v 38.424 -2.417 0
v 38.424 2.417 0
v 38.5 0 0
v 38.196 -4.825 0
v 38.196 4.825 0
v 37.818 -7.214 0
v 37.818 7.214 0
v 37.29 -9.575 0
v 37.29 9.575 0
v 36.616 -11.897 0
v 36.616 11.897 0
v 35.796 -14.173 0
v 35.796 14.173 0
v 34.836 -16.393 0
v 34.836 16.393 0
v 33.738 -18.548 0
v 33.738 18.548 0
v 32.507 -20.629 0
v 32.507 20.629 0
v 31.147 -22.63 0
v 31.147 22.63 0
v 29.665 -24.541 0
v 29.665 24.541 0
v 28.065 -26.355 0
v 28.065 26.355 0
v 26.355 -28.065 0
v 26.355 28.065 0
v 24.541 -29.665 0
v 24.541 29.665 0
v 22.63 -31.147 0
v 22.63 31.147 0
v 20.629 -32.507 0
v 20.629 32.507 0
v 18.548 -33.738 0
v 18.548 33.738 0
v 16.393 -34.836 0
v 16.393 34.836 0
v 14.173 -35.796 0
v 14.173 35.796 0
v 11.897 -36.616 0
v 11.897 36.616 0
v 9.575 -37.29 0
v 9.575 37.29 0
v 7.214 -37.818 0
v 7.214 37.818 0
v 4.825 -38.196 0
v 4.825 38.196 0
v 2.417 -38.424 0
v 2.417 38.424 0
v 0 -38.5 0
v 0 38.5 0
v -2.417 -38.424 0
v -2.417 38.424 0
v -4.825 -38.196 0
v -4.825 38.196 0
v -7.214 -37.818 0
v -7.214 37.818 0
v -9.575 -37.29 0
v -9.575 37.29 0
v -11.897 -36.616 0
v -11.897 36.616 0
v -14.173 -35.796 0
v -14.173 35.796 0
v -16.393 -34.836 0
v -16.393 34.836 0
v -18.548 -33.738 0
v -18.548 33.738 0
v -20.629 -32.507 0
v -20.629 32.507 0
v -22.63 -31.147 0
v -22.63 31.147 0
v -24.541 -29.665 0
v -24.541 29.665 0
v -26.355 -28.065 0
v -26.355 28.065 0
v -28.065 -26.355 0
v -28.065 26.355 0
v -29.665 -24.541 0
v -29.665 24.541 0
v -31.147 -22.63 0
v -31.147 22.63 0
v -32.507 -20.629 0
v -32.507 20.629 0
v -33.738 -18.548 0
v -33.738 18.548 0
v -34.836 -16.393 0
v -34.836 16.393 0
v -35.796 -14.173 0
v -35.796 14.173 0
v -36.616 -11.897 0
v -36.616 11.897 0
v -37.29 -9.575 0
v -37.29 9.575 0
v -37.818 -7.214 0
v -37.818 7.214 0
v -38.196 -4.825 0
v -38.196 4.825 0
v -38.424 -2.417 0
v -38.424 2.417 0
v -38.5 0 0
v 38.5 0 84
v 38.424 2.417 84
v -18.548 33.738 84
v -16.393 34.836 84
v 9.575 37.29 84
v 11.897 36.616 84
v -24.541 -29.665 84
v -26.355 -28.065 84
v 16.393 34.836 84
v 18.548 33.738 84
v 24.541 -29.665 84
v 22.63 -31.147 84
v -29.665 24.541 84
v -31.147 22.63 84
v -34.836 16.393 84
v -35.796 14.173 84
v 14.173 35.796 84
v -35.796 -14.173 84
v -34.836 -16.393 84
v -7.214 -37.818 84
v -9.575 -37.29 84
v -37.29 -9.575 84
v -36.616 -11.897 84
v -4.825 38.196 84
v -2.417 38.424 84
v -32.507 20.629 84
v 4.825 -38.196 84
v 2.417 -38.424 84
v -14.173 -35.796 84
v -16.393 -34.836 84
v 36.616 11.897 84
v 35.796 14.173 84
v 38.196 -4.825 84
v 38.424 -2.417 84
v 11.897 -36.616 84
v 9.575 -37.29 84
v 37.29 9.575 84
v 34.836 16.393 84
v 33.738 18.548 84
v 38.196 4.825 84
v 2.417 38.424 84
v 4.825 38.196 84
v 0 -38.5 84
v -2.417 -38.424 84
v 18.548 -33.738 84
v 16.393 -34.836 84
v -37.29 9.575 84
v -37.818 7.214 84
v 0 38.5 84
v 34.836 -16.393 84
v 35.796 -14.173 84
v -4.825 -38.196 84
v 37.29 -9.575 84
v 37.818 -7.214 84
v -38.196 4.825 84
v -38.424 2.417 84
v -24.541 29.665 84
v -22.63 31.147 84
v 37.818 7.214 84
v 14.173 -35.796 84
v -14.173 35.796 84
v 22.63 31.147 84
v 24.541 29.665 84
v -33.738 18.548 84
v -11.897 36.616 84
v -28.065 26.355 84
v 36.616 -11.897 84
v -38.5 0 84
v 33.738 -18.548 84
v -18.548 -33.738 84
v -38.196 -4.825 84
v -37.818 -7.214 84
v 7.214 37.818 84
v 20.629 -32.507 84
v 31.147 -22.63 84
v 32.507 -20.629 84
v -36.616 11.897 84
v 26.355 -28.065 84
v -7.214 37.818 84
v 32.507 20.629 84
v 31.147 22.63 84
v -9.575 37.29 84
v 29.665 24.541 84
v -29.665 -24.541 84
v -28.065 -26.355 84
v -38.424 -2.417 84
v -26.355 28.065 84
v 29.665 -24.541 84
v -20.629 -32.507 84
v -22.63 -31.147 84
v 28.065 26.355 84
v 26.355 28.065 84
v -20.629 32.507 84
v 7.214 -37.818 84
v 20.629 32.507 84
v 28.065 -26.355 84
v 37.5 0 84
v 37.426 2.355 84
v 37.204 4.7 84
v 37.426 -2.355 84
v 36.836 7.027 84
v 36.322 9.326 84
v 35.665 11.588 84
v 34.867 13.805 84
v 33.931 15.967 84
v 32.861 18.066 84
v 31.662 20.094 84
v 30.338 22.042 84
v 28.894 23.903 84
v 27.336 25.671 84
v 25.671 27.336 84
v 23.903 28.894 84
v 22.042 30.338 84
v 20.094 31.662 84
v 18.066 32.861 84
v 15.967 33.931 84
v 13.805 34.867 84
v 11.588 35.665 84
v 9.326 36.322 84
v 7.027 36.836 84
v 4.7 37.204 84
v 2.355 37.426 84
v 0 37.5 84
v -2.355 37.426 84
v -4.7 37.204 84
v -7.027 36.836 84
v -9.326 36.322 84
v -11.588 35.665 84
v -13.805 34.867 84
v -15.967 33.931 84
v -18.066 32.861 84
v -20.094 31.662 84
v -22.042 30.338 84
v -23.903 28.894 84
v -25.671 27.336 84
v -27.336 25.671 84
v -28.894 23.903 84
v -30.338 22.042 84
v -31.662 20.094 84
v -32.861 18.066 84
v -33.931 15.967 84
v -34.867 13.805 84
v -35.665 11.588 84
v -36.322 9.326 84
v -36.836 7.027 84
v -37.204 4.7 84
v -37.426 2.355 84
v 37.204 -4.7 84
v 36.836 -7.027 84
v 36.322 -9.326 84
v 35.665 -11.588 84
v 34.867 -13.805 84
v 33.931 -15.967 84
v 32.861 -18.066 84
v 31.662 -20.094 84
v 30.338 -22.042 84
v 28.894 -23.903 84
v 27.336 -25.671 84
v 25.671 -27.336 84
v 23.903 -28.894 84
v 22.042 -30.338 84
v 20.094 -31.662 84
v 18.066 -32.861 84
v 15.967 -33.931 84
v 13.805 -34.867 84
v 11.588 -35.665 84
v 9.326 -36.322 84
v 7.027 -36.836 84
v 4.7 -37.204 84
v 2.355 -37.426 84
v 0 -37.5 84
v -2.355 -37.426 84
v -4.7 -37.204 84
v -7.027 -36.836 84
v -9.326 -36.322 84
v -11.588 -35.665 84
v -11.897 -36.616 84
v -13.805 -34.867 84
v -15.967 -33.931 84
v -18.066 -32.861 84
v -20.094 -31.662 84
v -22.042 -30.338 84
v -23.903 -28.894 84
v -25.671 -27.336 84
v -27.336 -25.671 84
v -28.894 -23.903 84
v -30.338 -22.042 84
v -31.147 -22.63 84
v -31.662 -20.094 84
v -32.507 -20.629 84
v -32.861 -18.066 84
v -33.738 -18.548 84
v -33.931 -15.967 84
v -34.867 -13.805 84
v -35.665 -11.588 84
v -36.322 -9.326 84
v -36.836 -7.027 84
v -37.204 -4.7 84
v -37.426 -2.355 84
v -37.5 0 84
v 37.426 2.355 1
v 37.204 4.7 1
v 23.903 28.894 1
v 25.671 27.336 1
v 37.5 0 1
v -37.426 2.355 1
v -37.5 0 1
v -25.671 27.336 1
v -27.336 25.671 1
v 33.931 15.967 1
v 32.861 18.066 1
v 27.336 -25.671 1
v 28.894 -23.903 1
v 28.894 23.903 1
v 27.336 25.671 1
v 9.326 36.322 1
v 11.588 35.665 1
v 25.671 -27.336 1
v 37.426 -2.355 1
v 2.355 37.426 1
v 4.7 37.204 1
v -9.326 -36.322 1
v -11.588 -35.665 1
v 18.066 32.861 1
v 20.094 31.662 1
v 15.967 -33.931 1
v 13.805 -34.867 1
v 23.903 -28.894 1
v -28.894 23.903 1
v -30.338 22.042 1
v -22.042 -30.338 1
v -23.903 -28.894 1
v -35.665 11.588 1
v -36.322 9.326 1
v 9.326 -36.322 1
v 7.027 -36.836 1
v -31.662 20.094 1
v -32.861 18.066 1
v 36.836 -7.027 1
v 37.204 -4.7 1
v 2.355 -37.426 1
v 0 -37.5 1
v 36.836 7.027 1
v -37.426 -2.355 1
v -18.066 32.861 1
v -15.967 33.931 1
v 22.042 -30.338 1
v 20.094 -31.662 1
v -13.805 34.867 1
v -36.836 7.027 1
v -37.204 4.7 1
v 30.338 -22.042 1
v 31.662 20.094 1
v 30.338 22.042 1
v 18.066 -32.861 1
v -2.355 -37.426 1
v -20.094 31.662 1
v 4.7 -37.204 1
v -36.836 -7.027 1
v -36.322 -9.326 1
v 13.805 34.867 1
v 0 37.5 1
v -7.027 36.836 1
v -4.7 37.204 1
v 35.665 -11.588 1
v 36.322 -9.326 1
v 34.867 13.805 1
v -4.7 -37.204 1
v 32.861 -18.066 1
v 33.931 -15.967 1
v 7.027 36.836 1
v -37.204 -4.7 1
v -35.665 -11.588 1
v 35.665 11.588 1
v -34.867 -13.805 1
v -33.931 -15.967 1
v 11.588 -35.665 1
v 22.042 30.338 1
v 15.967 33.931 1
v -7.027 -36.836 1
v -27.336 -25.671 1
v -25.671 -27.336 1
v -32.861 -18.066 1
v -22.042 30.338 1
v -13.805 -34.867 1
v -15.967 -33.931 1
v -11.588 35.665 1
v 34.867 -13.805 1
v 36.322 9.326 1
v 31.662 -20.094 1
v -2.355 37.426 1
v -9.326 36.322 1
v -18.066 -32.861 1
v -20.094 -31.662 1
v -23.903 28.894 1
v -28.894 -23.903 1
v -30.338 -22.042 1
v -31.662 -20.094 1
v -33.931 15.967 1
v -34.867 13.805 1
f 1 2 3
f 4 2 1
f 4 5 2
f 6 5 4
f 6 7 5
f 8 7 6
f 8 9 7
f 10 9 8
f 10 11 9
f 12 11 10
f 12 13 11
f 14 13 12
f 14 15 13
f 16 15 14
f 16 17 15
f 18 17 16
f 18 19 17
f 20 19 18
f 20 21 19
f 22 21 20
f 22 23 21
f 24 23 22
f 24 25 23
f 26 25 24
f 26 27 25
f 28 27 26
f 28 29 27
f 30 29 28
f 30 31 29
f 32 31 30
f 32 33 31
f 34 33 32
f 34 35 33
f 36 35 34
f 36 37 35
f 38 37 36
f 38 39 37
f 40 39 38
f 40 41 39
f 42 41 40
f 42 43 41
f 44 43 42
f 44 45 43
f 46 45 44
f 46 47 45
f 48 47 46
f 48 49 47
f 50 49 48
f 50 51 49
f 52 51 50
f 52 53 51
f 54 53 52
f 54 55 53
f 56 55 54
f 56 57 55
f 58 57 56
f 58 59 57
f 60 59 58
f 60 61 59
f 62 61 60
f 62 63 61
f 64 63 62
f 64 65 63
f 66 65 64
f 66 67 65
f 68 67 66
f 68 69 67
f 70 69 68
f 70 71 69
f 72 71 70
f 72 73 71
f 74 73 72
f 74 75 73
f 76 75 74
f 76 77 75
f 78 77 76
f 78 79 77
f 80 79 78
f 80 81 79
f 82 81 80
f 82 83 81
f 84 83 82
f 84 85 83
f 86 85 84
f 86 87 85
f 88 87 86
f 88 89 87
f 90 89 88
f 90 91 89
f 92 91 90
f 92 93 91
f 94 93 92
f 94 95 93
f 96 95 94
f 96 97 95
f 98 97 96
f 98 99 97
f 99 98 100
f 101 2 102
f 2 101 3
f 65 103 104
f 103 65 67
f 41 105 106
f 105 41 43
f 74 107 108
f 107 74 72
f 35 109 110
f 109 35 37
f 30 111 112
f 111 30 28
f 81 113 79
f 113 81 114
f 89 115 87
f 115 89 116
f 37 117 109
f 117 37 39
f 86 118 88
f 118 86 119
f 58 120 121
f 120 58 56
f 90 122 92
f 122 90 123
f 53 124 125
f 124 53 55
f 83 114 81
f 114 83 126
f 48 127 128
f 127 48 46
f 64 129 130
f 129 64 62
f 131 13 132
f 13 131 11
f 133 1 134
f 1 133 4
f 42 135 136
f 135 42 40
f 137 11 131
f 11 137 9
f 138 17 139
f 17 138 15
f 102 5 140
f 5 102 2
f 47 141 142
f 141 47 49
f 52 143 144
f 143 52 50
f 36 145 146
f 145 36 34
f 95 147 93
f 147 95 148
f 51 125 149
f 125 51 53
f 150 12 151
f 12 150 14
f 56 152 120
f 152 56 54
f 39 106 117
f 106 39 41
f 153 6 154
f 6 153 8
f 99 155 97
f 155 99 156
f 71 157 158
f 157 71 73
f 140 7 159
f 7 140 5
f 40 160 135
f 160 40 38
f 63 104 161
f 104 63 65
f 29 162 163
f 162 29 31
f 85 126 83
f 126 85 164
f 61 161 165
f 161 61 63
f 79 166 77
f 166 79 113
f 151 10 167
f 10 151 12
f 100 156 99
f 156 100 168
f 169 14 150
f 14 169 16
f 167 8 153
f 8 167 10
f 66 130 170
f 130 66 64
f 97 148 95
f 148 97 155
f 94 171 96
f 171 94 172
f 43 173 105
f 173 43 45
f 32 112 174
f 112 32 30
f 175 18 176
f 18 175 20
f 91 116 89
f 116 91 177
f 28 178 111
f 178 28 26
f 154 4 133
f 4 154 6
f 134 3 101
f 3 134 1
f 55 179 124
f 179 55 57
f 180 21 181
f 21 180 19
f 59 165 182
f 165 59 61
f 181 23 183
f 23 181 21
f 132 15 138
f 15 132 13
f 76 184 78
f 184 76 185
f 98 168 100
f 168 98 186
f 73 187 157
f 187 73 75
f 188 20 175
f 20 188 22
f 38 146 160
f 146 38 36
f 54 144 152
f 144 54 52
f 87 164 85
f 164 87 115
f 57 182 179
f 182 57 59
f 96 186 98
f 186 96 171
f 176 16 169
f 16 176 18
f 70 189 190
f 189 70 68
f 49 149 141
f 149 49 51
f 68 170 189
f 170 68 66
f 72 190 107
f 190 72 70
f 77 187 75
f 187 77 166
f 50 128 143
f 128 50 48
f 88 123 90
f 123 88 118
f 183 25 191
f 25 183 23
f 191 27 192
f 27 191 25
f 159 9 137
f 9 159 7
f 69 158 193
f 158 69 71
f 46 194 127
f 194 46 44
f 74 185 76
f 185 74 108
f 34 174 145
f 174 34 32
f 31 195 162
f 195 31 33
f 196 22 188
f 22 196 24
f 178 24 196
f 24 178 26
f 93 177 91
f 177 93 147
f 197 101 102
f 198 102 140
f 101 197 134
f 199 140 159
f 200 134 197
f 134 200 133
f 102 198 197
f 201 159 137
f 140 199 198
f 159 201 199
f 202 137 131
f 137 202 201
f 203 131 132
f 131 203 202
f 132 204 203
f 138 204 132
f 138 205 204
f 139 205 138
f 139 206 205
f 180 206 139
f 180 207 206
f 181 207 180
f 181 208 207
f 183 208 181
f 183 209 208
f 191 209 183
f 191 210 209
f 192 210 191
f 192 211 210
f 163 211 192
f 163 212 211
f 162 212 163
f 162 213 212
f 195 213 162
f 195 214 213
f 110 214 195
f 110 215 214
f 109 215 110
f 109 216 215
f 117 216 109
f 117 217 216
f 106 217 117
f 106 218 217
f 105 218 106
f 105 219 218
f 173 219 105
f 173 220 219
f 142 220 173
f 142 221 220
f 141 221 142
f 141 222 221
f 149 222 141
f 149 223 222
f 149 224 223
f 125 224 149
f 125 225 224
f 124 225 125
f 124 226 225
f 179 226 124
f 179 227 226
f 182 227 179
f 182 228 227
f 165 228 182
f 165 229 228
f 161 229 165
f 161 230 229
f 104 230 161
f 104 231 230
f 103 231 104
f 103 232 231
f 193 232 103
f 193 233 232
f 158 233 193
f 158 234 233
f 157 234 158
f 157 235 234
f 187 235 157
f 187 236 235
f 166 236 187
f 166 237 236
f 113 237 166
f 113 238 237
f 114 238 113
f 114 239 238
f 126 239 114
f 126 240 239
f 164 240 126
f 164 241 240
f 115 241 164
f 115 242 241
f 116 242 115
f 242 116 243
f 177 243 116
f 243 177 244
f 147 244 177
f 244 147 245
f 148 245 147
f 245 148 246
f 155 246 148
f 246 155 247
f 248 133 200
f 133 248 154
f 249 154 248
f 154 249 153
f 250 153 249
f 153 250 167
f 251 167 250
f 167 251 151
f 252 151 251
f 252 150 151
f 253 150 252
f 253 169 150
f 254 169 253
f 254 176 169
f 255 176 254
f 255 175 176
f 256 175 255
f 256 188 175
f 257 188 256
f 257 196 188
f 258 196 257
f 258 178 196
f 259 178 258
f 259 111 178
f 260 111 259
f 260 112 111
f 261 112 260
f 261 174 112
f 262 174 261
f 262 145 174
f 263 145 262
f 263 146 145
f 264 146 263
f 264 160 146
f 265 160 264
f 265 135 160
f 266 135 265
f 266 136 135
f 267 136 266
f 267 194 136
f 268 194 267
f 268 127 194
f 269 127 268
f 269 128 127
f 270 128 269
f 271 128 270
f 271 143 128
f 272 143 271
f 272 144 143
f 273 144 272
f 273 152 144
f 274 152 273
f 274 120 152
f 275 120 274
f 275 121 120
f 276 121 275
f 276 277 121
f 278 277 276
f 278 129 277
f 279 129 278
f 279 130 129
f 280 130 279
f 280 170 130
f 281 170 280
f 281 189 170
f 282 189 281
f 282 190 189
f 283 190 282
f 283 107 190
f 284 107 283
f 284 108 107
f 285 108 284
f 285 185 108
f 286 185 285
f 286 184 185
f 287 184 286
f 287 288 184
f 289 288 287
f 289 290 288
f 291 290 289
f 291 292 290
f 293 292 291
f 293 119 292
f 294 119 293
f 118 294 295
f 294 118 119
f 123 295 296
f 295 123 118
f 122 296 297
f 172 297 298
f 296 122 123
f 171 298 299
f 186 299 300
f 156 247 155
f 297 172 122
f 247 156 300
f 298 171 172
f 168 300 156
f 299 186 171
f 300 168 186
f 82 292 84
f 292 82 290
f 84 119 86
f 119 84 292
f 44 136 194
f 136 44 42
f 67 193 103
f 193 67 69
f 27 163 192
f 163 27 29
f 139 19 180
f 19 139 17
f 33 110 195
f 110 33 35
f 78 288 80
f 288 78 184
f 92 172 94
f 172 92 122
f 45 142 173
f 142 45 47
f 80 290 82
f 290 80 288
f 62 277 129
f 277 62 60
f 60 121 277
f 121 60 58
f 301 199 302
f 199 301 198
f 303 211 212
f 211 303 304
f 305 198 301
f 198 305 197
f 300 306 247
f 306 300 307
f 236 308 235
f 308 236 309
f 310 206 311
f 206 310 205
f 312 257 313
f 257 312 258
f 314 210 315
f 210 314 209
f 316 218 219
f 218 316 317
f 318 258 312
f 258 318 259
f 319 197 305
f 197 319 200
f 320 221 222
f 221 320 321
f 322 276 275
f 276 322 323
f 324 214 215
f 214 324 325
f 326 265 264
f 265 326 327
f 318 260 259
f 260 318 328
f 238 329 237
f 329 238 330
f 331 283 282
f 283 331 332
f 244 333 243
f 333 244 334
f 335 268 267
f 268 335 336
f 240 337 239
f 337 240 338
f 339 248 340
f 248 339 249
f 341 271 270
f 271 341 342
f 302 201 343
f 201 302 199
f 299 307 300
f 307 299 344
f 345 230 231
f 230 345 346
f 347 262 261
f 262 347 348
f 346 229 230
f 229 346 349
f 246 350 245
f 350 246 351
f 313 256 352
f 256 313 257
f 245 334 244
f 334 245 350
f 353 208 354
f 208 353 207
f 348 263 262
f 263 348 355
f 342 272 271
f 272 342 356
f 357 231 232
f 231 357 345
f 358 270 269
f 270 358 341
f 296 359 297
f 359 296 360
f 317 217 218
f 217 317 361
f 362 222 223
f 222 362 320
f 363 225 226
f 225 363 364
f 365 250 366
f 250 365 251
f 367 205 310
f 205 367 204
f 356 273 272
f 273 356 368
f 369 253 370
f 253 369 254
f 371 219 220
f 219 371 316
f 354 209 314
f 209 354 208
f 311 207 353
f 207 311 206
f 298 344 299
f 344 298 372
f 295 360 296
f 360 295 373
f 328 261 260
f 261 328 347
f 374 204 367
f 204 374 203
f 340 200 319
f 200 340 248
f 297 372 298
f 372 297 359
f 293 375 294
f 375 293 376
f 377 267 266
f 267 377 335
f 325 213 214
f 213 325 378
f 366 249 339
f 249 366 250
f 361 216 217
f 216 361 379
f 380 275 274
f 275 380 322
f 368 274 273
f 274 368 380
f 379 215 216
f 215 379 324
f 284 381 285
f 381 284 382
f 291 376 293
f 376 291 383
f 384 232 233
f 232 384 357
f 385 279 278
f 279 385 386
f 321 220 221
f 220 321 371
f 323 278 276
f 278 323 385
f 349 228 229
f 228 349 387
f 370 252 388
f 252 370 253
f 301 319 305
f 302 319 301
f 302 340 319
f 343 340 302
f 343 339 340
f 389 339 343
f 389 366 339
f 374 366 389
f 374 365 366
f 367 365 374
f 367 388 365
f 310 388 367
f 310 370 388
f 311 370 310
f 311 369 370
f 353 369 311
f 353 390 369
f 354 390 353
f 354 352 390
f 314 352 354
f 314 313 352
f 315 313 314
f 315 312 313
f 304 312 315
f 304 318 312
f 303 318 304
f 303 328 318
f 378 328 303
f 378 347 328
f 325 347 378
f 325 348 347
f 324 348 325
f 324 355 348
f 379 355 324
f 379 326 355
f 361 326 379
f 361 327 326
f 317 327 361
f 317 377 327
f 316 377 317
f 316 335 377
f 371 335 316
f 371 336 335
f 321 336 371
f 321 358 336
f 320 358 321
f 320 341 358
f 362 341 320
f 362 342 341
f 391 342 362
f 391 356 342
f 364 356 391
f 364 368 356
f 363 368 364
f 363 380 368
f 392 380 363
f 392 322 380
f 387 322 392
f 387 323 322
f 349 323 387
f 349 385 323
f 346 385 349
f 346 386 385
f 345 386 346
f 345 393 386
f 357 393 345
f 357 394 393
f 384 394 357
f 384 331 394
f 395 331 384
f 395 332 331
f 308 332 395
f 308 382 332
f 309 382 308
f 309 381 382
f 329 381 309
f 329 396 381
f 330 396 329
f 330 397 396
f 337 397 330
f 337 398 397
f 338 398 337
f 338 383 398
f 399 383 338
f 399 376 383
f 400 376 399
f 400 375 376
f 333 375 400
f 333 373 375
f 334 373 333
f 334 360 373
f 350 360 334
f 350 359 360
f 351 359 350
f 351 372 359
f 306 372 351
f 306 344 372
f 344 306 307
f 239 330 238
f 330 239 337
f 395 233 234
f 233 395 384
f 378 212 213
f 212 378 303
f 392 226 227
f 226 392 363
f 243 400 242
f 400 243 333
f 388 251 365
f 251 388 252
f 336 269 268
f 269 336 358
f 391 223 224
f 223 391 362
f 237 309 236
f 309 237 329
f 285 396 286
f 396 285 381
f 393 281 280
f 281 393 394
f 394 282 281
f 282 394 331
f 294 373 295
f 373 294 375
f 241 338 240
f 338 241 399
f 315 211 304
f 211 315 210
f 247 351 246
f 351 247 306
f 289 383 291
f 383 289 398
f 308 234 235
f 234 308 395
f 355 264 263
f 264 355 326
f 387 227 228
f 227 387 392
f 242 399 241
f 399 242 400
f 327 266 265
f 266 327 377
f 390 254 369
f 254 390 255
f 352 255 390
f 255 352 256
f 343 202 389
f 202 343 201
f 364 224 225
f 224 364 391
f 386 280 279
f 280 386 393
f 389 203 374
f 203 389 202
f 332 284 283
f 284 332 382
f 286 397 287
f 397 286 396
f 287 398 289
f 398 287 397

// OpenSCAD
module rounded_rect(a, r) {
  if (a < 2 * r) {
    translate([-a/2 + r, -a/2 + r]) {
      minkowski() {
        square([a - 2*r, a - 2*r]);
        circle(r = r, $fn = 100);
      }
    }
  }
  else {
    circle(r = r, $fn = 100);
  }
}

module pot_outer_face(a, r) {
  rounded_rect(a, r);
}

module pot_inner_face(a, t, r) {
  rounded_rect(a - 2*t, r - t);
}

module pot_template(h, a, t, r) {
  difference() {
    linear_extrude(height = h) {
      pot_outer_face(a, r);
    }
    translate([0, 0, t]) {
      linear_extrude(height = h - t + 1) {
        pot_inner_face(a, t, r);
      }
    }
  }
}

module pot(type, debug = false) {
  if (type == "carrefour") {
    h = 100;
    a = 76;
    t = 1;
    r = 11;
    pot_template(h, a, t, r);
  }
  else if (type == "lidl") {
    h = 84;
    a = 77;
    t = 1;
    r = a / 2;
    pot_template(h, a, t, r);
  }
}

module TEST_pot_slice(type) {
  linear_extrude(height = 1) {
    projection(cut = true) {
      translate([0, 0, -10]) {
        pot(type);
      }
    }
  }
}

pot("lidl");
/* TEST_pot_slice("lidl"); */
